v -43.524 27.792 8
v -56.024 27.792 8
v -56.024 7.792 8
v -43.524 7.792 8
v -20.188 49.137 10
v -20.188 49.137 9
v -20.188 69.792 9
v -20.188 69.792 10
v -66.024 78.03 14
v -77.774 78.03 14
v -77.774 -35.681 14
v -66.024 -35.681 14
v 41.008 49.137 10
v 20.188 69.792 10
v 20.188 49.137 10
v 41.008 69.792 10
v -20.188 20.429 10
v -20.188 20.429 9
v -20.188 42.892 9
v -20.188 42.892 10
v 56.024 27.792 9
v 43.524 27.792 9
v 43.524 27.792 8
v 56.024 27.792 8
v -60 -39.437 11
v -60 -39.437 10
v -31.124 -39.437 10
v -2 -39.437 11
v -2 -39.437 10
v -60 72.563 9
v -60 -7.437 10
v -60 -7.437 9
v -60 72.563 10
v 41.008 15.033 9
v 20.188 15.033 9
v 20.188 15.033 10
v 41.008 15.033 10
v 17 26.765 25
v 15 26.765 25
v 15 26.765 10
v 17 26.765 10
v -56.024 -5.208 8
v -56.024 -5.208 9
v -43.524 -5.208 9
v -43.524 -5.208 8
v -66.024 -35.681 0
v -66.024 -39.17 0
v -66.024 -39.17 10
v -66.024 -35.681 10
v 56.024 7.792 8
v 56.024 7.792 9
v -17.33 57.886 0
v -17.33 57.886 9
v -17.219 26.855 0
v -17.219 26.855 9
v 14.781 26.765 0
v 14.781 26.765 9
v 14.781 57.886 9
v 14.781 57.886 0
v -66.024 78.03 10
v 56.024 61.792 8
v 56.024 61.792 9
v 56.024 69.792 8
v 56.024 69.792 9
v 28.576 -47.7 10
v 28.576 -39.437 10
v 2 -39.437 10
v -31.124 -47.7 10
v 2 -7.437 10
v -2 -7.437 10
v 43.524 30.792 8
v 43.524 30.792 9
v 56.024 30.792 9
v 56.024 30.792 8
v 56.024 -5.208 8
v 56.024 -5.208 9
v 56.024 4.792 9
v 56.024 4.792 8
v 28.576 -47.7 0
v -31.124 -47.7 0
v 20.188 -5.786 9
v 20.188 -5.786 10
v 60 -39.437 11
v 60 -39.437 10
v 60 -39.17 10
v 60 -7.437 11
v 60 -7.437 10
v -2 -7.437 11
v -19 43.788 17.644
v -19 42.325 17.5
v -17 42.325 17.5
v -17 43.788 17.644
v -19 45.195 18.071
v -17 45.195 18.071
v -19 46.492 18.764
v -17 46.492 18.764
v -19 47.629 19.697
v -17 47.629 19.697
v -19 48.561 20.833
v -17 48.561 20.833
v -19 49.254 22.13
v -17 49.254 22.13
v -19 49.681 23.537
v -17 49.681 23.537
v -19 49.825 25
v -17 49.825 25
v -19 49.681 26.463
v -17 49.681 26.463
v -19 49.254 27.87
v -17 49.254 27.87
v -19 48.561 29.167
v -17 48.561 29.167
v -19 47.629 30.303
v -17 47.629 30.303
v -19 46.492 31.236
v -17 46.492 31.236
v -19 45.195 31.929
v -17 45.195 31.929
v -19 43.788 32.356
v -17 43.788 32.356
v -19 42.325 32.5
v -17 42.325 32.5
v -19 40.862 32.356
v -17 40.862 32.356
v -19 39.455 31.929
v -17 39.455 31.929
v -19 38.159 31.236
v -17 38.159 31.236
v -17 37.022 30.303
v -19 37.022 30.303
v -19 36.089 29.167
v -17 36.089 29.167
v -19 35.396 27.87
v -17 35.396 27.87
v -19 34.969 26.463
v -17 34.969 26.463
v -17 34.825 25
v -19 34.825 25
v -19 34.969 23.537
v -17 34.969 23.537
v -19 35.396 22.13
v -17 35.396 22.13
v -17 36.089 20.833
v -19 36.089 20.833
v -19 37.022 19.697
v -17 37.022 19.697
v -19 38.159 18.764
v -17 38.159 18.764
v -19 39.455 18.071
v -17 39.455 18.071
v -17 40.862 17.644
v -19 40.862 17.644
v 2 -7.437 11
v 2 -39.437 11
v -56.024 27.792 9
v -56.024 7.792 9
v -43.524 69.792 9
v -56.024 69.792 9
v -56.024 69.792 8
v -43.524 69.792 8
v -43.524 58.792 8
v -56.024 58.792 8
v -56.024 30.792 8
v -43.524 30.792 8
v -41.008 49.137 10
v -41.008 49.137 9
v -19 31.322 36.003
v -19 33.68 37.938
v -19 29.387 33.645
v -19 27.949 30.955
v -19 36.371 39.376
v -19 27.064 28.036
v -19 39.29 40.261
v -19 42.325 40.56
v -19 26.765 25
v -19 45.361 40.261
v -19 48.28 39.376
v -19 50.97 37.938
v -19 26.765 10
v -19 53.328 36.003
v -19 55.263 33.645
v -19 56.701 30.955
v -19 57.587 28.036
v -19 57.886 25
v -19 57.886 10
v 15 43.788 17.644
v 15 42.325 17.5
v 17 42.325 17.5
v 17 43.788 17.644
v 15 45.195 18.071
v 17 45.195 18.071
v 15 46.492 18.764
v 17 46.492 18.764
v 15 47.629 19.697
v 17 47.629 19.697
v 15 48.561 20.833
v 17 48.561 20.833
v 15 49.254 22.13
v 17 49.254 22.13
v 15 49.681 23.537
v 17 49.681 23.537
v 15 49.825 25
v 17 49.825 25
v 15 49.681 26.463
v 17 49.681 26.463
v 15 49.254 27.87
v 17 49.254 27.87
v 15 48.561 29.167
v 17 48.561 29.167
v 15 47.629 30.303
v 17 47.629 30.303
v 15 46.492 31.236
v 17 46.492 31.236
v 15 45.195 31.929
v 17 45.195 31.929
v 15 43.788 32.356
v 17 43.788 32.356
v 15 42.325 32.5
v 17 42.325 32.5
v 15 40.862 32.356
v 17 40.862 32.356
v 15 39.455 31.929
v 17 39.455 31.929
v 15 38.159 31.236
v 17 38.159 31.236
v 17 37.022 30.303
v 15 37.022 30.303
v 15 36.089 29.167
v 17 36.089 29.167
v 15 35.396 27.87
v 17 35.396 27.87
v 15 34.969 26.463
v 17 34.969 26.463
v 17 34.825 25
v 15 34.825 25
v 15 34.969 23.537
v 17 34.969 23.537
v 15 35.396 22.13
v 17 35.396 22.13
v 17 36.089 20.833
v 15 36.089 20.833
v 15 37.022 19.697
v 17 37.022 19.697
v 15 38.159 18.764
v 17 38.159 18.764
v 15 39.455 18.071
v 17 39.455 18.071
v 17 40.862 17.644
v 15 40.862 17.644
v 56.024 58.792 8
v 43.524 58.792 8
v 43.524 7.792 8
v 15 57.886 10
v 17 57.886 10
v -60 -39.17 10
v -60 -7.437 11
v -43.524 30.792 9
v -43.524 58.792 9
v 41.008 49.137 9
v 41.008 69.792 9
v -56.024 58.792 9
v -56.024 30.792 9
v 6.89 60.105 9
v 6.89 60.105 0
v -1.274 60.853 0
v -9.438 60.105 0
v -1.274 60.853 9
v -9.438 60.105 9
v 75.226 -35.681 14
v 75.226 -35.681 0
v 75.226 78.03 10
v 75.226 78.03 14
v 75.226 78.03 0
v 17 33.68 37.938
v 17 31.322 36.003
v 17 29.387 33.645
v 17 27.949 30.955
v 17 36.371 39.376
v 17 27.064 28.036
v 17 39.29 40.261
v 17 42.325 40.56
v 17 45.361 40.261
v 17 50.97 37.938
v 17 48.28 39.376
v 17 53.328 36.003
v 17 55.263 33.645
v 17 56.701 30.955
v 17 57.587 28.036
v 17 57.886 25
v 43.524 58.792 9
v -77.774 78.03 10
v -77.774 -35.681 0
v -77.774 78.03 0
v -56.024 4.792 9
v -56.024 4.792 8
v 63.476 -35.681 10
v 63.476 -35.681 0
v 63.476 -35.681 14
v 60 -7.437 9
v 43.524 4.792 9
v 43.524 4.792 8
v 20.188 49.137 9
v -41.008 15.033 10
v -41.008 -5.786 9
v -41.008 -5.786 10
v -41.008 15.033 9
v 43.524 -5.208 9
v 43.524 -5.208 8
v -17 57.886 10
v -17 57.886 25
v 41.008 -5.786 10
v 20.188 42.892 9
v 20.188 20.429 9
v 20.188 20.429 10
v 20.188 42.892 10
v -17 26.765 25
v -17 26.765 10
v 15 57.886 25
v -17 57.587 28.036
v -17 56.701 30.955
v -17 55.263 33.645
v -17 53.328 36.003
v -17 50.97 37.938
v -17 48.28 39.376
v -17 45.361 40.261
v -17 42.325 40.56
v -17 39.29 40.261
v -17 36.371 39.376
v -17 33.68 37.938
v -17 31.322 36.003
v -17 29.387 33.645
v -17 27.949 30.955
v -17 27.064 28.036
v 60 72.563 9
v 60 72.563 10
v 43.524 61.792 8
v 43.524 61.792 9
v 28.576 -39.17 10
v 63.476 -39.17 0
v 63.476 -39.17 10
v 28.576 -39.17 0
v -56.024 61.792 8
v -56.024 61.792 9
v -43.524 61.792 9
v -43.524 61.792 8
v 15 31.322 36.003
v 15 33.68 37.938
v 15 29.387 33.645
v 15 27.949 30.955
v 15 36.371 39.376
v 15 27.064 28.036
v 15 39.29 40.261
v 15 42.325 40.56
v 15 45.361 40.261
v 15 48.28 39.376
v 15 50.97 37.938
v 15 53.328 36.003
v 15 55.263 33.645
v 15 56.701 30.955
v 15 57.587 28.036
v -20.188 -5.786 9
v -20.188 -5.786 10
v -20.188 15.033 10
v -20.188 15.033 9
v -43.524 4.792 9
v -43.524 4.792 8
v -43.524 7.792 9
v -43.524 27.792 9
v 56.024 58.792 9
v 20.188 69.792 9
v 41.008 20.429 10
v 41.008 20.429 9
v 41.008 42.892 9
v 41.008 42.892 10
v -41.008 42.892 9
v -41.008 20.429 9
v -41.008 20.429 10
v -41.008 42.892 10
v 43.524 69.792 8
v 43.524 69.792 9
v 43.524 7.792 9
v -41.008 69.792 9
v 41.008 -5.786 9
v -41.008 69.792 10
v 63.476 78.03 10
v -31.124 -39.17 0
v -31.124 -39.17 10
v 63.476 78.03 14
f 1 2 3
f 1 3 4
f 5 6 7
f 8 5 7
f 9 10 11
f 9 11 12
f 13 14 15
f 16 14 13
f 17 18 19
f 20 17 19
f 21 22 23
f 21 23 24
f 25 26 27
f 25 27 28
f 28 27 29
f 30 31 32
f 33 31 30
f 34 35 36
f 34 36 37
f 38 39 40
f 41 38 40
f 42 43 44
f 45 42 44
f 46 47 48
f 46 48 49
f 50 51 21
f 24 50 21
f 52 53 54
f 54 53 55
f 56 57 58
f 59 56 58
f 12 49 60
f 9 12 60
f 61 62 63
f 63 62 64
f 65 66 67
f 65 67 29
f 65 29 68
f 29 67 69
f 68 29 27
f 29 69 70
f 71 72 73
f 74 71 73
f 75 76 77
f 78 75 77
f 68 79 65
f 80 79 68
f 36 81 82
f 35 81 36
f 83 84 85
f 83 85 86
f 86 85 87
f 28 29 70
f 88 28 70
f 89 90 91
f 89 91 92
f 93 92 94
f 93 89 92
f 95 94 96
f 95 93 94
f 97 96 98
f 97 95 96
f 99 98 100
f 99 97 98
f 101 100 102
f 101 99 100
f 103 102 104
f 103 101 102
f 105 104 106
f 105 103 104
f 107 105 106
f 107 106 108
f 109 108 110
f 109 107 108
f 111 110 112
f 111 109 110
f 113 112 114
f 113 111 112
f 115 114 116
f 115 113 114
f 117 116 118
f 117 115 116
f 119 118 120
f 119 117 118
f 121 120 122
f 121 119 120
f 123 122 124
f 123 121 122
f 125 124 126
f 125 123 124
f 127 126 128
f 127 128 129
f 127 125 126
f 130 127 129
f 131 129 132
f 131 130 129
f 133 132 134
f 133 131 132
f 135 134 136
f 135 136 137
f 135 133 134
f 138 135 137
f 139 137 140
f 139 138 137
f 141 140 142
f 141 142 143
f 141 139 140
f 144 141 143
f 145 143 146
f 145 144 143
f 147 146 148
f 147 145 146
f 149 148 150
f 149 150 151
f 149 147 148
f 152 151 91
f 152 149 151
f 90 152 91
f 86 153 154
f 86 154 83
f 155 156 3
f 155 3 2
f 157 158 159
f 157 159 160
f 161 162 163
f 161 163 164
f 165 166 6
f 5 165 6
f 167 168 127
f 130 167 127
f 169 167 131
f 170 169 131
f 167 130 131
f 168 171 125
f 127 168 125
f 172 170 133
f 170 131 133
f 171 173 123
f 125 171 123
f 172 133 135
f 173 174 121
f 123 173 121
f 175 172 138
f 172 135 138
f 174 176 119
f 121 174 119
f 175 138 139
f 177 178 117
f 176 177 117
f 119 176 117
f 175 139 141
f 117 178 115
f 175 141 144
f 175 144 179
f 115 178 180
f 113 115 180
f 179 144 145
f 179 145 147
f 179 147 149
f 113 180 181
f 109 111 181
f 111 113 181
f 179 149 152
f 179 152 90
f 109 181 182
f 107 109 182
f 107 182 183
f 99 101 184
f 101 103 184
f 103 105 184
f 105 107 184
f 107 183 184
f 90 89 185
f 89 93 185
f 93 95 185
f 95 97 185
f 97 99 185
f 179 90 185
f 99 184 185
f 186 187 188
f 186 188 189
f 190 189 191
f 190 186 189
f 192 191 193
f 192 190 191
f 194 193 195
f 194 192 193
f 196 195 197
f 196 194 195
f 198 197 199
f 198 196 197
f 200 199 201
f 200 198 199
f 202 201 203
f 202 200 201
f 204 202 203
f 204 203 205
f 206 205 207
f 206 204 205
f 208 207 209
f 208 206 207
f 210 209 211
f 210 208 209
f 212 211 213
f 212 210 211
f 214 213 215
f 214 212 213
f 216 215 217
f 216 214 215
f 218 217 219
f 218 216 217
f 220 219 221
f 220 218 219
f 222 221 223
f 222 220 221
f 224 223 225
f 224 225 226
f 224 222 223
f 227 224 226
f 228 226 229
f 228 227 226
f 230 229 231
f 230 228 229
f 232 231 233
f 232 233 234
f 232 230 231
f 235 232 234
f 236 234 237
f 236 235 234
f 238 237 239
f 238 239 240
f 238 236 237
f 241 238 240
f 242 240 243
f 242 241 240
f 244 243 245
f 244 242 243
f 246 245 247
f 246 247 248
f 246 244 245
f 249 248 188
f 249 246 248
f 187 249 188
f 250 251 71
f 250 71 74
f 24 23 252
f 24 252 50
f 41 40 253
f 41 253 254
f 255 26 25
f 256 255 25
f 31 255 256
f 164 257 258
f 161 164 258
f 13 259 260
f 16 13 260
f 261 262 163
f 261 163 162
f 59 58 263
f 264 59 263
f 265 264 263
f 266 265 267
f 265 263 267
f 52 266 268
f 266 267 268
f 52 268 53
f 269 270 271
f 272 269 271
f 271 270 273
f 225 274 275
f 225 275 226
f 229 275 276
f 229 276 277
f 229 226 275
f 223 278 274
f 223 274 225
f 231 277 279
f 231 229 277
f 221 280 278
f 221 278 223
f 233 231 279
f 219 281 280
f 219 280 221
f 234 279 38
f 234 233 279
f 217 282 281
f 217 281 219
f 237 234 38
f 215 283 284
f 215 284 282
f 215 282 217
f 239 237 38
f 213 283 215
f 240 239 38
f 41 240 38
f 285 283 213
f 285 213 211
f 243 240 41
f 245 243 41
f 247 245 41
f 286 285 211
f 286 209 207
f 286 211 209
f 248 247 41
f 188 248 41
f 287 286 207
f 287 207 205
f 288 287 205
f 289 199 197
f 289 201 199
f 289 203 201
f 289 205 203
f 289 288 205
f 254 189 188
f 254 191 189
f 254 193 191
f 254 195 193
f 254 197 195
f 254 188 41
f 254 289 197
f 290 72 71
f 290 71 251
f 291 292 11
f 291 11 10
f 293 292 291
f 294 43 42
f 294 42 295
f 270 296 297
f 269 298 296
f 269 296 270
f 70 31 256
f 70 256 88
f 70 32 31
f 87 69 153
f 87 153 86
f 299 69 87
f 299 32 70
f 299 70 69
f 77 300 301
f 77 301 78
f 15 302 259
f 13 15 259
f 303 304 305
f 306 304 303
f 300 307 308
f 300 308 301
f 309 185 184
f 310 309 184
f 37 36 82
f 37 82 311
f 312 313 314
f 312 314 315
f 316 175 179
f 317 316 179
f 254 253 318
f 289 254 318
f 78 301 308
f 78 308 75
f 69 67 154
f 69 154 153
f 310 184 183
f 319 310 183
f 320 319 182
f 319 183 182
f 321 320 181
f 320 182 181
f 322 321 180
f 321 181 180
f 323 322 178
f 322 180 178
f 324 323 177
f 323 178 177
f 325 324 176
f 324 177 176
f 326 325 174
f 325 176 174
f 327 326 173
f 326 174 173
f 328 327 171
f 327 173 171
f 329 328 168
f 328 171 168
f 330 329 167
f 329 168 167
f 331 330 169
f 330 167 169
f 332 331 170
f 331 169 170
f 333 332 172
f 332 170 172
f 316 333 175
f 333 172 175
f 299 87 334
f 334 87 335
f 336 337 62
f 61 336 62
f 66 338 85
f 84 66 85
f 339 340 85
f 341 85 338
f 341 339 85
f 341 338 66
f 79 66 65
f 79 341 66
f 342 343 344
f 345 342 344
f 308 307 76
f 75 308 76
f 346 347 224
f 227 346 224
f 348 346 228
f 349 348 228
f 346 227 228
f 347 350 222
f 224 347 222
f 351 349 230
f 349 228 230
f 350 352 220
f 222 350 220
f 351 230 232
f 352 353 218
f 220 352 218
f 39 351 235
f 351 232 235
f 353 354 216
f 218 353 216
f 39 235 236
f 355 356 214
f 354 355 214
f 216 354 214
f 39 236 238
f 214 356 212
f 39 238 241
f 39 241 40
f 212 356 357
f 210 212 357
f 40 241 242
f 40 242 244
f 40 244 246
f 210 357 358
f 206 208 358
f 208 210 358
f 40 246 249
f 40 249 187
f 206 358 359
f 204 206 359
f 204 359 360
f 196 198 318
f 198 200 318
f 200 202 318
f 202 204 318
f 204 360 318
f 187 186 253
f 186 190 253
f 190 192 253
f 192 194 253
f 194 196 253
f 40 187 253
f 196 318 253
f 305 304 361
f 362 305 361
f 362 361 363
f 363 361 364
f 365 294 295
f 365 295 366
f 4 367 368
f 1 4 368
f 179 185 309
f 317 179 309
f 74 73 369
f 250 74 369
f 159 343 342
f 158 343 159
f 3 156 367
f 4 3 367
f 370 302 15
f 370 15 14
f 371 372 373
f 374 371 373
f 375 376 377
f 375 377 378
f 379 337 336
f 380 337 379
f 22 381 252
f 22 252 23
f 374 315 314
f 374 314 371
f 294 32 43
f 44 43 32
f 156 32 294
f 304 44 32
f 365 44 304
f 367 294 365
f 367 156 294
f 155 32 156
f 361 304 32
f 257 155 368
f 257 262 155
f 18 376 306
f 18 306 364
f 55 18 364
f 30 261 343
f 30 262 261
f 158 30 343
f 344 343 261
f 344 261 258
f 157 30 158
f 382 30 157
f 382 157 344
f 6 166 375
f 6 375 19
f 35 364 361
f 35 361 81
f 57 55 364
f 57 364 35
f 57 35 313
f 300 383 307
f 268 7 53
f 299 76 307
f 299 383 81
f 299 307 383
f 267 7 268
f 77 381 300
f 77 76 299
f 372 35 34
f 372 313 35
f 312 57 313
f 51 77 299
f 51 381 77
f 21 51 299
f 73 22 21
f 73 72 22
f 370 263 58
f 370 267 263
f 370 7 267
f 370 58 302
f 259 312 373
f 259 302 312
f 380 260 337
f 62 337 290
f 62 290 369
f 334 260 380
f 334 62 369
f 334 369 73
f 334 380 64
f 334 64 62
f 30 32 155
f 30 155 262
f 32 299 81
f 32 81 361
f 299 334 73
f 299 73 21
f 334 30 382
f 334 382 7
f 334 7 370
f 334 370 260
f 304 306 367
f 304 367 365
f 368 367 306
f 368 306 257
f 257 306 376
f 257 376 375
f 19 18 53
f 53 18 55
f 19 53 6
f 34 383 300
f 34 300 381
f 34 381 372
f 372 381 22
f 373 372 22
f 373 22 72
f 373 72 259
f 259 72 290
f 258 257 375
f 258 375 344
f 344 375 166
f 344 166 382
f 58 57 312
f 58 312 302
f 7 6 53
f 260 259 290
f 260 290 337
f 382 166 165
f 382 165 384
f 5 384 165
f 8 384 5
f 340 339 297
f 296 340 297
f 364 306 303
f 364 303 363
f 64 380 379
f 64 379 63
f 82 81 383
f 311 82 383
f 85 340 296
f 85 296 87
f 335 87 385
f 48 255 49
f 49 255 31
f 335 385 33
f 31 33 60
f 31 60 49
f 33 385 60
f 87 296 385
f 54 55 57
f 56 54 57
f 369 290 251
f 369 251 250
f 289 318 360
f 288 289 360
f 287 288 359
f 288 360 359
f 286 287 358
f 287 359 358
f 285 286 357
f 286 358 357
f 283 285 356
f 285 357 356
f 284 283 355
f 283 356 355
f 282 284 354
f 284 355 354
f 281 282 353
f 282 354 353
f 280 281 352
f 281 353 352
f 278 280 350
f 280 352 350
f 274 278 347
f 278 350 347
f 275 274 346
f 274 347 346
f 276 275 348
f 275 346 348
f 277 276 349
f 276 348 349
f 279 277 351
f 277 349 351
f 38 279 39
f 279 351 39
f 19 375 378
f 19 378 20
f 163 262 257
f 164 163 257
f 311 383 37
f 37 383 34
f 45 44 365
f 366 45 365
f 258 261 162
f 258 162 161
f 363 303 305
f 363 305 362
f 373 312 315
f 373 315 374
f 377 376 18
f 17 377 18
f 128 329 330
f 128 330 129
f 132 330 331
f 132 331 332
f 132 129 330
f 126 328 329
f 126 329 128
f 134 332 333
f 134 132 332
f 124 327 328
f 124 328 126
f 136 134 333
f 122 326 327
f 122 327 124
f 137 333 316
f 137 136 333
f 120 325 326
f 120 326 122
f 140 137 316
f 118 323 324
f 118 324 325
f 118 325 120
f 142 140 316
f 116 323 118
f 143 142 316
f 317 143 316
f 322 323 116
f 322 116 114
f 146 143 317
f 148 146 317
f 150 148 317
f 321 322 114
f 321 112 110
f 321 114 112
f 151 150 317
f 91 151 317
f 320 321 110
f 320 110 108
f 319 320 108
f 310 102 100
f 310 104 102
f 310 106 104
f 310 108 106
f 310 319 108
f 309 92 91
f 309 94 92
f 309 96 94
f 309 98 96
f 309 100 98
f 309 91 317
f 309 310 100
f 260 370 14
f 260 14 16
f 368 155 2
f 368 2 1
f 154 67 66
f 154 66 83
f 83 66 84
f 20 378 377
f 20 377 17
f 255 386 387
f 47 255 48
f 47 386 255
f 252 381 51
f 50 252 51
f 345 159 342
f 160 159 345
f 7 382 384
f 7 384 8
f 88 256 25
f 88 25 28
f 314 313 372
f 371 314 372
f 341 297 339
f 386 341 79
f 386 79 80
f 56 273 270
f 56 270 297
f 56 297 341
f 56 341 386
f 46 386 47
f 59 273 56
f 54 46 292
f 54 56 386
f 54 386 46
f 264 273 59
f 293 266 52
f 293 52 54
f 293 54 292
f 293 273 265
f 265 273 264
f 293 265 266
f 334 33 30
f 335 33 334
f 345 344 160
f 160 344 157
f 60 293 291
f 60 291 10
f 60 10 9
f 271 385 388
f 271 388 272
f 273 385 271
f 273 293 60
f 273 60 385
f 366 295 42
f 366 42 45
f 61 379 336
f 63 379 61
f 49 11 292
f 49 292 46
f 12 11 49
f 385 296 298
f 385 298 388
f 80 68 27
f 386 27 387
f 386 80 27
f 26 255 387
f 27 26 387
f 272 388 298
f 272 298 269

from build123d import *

# Parameters (mm, degrees)
BOSS_EXTRUDE1_DEPTH = 10
CUT_EXTRUDE1_DEPTH  = 60
SKETCH8_R           = 7.5
BOSS_EXTRUDE4_DEPTH = 2
BOSS_EXTRUDE5_START = -2
SKETCH9_R           = 7.5
BOSS_EXTRUDE5_DEPTH = 2
SKETCH2_W           = 11.75
SKETCH2_H           = 134.399993897
BOSS_EXTRUDE6_DEPTH = 4
SKETCH11_W          = 12.5
SKETCH11_H          = 8
SKETCH11_H_2        = 28
SKETCH11_H_3        = 20
SKETCH11_H_4        = 10
CUT_EXTRUDE2_DEPTH  = 2
SKETCH12_W          = 120
SKETCH12_H          = 80
CUT_EXTRUDE4_DEPTH  = 1
SKETCH14_W          = 20.819436715
SKETCH14_H          = 20.654659611
SKETCH14_H_2        = 22.463076456
SKETCH14_H_3        = 20.818440047
BOSS_EXTRUDE7_DEPTH = 1
SKETCH15_W          = 58
SKETCH15_H          = 32
BOSS_EXTRUDE8_DEPTH = 1
SKETCH16_W          = 11.75
SKETCH16_H          = 20.68871607
CUT_EXTRUDE5_DEPTH  = 30


with BuildPart() as part:
    # Sketch1 → Boss-Extrude1 (new body)
    with BuildSketch(Plane.XY):
        Polygon((-66.024135719, -56.369843335), (-77.774135719, -56.369843335), (-77.774135719, 78.030150562), (75.225864281, 78.030150562), (75.225864281, -56.369843335), (63.475864281, -56.369843335), (63.475864281, -39.169831128), (28.575870384, -39.169831128), (28.575870384, -47.699860425), (-31.124141823, -47.699860425), (-31.124141823, -39.169831128), (-66.024135719, -39.169831128), align=None)
    extrude(amount=BOSS_EXTRUDE1_DEPTH)

    # Sketch3 → Cut-Extrude1 (cut)
    with BuildSketch(Plane.XY.offset(10)):
        with BuildLine():
            Line((-17.218593727, 26.855220573), (14.781406273, 26.764980095))
            Line((14.781406273, 26.764980095), (14.781406273, 57.885585563))
            ThreePointArc((14.781406273, 57.885585563), (-1.274135719, 60.852645916), (-17.329677711, 57.885585563))
            Line((-17.329677711, 57.885585563), (-17.218593727, 26.855220573))
        make_face()
    extrude(amount=-CUT_EXTRUDE1_DEPTH, mode=Mode.SUBTRACT)

    # Sketch8 → Boss-Extrude4 (add)
    with BuildSketch(Plane(origin=(15, 0, 0), x_dir=(0, 0, -1), z_dir=(1, 0, 0))):
        with BuildLine():
            Line((-10, 26.764980095), (-10, 57.885585563))
            Line((-10, 57.885585563), (-25, 57.885585563))
            ThreePointArc((-25, 57.885585563), (-40.560302734, 42.325282829), (-25, 26.764980095))
            Line((-25, 26.764980095), (-10, 26.764980095))
        make_face()
        with Locations((-25, 42.325282829)):
            Circle(SKETCH8_R, mode=Mode.SUBTRACT)
    extrude(amount=BOSS_EXTRUDE4_DEPTH)

    # Sketch9 → Boss-Extrude5 (add)
    with BuildSketch(Plane(origin=(-17, 0, 0), x_dir=(0, 0, -1), z_dir=(1, 0, 0)).offset(BOSS_EXTRUDE5_START)):
        with BuildLine():
            Line((-10, 57.885585563), (-25, 57.885585563))
            ThreePointArc((-25, 57.885585563), (-40.560302734, 42.325282829), (-25, 26.764980095))
            Line((-25, 26.764980095), (-10, 26.764980095))
            Line((-10, 26.764980095), (-10, 57.885585563))
        make_face()
        with Locations((-25, 42.325282829)):
            Circle(SKETCH9_R, mode=Mode.SUBTRACT)
    extrude(amount=BOSS_EXTRUDE5_DEPTH)

    # Sketch2 → Boss-Extrude6 (add)
    with BuildSketch(Plane.XY.offset(10)):
        with Locations((69.350864281, 10.830153613)):
            Rectangle(SKETCH2_W, SKETCH2_H)
        with Locations((-71.899135719, 10.830153613)):
            Rectangle(SKETCH2_W, SKETCH2_H)
    extrude(amount=BOSS_EXTRUDE6_DEPTH)

    # Sketch11 → Cut-Extrude2 (cut)
    with BuildSketch(Plane.XY.offset(10)):
        with Locations((-49.774135719, 65.792146082)):
            Rectangle(SKETCH11_W, SKETCH11_H)
        with Locations((-49.774135719, 44.792146082)):
            Rectangle(SKETCH11_W, SKETCH11_H_2)
        with Locations((-49.774135719, 17.792146082)):
            Rectangle(SKETCH11_W, SKETCH11_H_3)
        with Locations((-49.774135719, -0.207853918)):
            Rectangle(SKETCH11_W, SKETCH11_H_4)
        with Locations((49.774135719, -0.207853918)):
            Rectangle(SKETCH11_W, SKETCH11_H_4)
        with Locations((49.774135719, 17.792146082)):
            Rectangle(SKETCH11_W, SKETCH11_H_3)
        with Locations((49.774135719, 44.792146082)):
            Rectangle(SKETCH11_W, SKETCH11_H_2)
        with Locations((49.774135719, 65.792146082)):
            Rectangle(SKETCH11_W, SKETCH11_H)
    extrude(amount=-CUT_EXTRUDE2_DEPTH, mode=Mode.SUBTRACT)

    # Sketch12 → Cut-Extrude4 (cut)
    with BuildSketch(Plane.XY.offset(10)):
        with Locations((0, 32.562566027)):
            Rectangle(SKETCH12_W, SKETCH12_H)
    extrude(amount=-CUT_EXTRUDE4_DEPTH, mode=Mode.SUBTRACT)


with BuildPart() as cut_extrude4_piece_1:
    # of the separate pieces the step leaves, piece 1, a body of its own (cut_extrude4_pieces)
    add(part.part.solids().sort_by_distance((-66.024135719, -56.369843335, 0))[0])

    # Sketch14 → Boss-Extrude7 (add)
    with BuildSketch(Plane.XY.offset(9)):
        with Locations((-30.597905478, 59.464816277)):
            Rectangle(SKETCH14_W, SKETCH14_H)
        with Locations((-30.597905478, 31.660117229)):
            Rectangle(SKETCH14_W, SKETCH14_H_2)
        with Locations((-30.597905478, 4.62341571)):
            Rectangle(SKETCH14_W, SKETCH14_H_3)
        with Locations((30.597905478, 31.660117229)):
            Rectangle(SKETCH14_W, SKETCH14_H_2)
        with Locations((30.597905478, 59.464816277)):
            Rectangle(SKETCH14_W, SKETCH14_H)
        with Locations((30.597905478, 4.62341571)):
            Rectangle(SKETCH14_W, SKETCH14_H_3)
    extrude(amount=BOSS_EXTRUDE7_DEPTH)

    # Sketch15 → Boss-Extrude8 (add)
    with BuildSketch(Plane.XY.offset(10)):
        with Locations((-31, -23.437433973)):
            Rectangle(SKETCH15_W, SKETCH15_H)
        with Locations((31, -23.437433973)):
            Rectangle(SKETCH15_W, SKETCH15_H)
    extrude(amount=BOSS_EXTRUDE8_DEPTH)

    # Sketch16 → Cut-Extrude5 (cut)
    with BuildSketch(Plane.XY.offset(14)):
        with Locations((-71.899135719, -46.0254853)):
            Rectangle(SKETCH16_W, SKETCH16_H)
        with Locations((69.350864281, -46.0254853)):
            Rectangle(SKETCH16_W, SKETCH16_H)
    extrude(amount=-CUT_EXTRUDE5_DEPTH, mode=Mode.SUBTRACT)


with BuildPart() as cut_extrude4_piece_2:
    # of the separate pieces the step leaves, piece 2, a body of its own (cut_extrude4_pieces)
    add(part.part.solids().sort_by_distance((15, 26.764980095, 25))[0])


with BuildPart() as cut_extrude4_piece_3:
    # of the separate pieces the step leaves, piece 3, a body of its own (cut_extrude4_pieces)
    add(part.part.solids().sort_by_distance((-17, 26.764980095, 25))[0])


solid = Compound([cut_extrude4_piece_1.part, cut_extrude4_piece_2.part, cut_extrude4_piece_3.part])
